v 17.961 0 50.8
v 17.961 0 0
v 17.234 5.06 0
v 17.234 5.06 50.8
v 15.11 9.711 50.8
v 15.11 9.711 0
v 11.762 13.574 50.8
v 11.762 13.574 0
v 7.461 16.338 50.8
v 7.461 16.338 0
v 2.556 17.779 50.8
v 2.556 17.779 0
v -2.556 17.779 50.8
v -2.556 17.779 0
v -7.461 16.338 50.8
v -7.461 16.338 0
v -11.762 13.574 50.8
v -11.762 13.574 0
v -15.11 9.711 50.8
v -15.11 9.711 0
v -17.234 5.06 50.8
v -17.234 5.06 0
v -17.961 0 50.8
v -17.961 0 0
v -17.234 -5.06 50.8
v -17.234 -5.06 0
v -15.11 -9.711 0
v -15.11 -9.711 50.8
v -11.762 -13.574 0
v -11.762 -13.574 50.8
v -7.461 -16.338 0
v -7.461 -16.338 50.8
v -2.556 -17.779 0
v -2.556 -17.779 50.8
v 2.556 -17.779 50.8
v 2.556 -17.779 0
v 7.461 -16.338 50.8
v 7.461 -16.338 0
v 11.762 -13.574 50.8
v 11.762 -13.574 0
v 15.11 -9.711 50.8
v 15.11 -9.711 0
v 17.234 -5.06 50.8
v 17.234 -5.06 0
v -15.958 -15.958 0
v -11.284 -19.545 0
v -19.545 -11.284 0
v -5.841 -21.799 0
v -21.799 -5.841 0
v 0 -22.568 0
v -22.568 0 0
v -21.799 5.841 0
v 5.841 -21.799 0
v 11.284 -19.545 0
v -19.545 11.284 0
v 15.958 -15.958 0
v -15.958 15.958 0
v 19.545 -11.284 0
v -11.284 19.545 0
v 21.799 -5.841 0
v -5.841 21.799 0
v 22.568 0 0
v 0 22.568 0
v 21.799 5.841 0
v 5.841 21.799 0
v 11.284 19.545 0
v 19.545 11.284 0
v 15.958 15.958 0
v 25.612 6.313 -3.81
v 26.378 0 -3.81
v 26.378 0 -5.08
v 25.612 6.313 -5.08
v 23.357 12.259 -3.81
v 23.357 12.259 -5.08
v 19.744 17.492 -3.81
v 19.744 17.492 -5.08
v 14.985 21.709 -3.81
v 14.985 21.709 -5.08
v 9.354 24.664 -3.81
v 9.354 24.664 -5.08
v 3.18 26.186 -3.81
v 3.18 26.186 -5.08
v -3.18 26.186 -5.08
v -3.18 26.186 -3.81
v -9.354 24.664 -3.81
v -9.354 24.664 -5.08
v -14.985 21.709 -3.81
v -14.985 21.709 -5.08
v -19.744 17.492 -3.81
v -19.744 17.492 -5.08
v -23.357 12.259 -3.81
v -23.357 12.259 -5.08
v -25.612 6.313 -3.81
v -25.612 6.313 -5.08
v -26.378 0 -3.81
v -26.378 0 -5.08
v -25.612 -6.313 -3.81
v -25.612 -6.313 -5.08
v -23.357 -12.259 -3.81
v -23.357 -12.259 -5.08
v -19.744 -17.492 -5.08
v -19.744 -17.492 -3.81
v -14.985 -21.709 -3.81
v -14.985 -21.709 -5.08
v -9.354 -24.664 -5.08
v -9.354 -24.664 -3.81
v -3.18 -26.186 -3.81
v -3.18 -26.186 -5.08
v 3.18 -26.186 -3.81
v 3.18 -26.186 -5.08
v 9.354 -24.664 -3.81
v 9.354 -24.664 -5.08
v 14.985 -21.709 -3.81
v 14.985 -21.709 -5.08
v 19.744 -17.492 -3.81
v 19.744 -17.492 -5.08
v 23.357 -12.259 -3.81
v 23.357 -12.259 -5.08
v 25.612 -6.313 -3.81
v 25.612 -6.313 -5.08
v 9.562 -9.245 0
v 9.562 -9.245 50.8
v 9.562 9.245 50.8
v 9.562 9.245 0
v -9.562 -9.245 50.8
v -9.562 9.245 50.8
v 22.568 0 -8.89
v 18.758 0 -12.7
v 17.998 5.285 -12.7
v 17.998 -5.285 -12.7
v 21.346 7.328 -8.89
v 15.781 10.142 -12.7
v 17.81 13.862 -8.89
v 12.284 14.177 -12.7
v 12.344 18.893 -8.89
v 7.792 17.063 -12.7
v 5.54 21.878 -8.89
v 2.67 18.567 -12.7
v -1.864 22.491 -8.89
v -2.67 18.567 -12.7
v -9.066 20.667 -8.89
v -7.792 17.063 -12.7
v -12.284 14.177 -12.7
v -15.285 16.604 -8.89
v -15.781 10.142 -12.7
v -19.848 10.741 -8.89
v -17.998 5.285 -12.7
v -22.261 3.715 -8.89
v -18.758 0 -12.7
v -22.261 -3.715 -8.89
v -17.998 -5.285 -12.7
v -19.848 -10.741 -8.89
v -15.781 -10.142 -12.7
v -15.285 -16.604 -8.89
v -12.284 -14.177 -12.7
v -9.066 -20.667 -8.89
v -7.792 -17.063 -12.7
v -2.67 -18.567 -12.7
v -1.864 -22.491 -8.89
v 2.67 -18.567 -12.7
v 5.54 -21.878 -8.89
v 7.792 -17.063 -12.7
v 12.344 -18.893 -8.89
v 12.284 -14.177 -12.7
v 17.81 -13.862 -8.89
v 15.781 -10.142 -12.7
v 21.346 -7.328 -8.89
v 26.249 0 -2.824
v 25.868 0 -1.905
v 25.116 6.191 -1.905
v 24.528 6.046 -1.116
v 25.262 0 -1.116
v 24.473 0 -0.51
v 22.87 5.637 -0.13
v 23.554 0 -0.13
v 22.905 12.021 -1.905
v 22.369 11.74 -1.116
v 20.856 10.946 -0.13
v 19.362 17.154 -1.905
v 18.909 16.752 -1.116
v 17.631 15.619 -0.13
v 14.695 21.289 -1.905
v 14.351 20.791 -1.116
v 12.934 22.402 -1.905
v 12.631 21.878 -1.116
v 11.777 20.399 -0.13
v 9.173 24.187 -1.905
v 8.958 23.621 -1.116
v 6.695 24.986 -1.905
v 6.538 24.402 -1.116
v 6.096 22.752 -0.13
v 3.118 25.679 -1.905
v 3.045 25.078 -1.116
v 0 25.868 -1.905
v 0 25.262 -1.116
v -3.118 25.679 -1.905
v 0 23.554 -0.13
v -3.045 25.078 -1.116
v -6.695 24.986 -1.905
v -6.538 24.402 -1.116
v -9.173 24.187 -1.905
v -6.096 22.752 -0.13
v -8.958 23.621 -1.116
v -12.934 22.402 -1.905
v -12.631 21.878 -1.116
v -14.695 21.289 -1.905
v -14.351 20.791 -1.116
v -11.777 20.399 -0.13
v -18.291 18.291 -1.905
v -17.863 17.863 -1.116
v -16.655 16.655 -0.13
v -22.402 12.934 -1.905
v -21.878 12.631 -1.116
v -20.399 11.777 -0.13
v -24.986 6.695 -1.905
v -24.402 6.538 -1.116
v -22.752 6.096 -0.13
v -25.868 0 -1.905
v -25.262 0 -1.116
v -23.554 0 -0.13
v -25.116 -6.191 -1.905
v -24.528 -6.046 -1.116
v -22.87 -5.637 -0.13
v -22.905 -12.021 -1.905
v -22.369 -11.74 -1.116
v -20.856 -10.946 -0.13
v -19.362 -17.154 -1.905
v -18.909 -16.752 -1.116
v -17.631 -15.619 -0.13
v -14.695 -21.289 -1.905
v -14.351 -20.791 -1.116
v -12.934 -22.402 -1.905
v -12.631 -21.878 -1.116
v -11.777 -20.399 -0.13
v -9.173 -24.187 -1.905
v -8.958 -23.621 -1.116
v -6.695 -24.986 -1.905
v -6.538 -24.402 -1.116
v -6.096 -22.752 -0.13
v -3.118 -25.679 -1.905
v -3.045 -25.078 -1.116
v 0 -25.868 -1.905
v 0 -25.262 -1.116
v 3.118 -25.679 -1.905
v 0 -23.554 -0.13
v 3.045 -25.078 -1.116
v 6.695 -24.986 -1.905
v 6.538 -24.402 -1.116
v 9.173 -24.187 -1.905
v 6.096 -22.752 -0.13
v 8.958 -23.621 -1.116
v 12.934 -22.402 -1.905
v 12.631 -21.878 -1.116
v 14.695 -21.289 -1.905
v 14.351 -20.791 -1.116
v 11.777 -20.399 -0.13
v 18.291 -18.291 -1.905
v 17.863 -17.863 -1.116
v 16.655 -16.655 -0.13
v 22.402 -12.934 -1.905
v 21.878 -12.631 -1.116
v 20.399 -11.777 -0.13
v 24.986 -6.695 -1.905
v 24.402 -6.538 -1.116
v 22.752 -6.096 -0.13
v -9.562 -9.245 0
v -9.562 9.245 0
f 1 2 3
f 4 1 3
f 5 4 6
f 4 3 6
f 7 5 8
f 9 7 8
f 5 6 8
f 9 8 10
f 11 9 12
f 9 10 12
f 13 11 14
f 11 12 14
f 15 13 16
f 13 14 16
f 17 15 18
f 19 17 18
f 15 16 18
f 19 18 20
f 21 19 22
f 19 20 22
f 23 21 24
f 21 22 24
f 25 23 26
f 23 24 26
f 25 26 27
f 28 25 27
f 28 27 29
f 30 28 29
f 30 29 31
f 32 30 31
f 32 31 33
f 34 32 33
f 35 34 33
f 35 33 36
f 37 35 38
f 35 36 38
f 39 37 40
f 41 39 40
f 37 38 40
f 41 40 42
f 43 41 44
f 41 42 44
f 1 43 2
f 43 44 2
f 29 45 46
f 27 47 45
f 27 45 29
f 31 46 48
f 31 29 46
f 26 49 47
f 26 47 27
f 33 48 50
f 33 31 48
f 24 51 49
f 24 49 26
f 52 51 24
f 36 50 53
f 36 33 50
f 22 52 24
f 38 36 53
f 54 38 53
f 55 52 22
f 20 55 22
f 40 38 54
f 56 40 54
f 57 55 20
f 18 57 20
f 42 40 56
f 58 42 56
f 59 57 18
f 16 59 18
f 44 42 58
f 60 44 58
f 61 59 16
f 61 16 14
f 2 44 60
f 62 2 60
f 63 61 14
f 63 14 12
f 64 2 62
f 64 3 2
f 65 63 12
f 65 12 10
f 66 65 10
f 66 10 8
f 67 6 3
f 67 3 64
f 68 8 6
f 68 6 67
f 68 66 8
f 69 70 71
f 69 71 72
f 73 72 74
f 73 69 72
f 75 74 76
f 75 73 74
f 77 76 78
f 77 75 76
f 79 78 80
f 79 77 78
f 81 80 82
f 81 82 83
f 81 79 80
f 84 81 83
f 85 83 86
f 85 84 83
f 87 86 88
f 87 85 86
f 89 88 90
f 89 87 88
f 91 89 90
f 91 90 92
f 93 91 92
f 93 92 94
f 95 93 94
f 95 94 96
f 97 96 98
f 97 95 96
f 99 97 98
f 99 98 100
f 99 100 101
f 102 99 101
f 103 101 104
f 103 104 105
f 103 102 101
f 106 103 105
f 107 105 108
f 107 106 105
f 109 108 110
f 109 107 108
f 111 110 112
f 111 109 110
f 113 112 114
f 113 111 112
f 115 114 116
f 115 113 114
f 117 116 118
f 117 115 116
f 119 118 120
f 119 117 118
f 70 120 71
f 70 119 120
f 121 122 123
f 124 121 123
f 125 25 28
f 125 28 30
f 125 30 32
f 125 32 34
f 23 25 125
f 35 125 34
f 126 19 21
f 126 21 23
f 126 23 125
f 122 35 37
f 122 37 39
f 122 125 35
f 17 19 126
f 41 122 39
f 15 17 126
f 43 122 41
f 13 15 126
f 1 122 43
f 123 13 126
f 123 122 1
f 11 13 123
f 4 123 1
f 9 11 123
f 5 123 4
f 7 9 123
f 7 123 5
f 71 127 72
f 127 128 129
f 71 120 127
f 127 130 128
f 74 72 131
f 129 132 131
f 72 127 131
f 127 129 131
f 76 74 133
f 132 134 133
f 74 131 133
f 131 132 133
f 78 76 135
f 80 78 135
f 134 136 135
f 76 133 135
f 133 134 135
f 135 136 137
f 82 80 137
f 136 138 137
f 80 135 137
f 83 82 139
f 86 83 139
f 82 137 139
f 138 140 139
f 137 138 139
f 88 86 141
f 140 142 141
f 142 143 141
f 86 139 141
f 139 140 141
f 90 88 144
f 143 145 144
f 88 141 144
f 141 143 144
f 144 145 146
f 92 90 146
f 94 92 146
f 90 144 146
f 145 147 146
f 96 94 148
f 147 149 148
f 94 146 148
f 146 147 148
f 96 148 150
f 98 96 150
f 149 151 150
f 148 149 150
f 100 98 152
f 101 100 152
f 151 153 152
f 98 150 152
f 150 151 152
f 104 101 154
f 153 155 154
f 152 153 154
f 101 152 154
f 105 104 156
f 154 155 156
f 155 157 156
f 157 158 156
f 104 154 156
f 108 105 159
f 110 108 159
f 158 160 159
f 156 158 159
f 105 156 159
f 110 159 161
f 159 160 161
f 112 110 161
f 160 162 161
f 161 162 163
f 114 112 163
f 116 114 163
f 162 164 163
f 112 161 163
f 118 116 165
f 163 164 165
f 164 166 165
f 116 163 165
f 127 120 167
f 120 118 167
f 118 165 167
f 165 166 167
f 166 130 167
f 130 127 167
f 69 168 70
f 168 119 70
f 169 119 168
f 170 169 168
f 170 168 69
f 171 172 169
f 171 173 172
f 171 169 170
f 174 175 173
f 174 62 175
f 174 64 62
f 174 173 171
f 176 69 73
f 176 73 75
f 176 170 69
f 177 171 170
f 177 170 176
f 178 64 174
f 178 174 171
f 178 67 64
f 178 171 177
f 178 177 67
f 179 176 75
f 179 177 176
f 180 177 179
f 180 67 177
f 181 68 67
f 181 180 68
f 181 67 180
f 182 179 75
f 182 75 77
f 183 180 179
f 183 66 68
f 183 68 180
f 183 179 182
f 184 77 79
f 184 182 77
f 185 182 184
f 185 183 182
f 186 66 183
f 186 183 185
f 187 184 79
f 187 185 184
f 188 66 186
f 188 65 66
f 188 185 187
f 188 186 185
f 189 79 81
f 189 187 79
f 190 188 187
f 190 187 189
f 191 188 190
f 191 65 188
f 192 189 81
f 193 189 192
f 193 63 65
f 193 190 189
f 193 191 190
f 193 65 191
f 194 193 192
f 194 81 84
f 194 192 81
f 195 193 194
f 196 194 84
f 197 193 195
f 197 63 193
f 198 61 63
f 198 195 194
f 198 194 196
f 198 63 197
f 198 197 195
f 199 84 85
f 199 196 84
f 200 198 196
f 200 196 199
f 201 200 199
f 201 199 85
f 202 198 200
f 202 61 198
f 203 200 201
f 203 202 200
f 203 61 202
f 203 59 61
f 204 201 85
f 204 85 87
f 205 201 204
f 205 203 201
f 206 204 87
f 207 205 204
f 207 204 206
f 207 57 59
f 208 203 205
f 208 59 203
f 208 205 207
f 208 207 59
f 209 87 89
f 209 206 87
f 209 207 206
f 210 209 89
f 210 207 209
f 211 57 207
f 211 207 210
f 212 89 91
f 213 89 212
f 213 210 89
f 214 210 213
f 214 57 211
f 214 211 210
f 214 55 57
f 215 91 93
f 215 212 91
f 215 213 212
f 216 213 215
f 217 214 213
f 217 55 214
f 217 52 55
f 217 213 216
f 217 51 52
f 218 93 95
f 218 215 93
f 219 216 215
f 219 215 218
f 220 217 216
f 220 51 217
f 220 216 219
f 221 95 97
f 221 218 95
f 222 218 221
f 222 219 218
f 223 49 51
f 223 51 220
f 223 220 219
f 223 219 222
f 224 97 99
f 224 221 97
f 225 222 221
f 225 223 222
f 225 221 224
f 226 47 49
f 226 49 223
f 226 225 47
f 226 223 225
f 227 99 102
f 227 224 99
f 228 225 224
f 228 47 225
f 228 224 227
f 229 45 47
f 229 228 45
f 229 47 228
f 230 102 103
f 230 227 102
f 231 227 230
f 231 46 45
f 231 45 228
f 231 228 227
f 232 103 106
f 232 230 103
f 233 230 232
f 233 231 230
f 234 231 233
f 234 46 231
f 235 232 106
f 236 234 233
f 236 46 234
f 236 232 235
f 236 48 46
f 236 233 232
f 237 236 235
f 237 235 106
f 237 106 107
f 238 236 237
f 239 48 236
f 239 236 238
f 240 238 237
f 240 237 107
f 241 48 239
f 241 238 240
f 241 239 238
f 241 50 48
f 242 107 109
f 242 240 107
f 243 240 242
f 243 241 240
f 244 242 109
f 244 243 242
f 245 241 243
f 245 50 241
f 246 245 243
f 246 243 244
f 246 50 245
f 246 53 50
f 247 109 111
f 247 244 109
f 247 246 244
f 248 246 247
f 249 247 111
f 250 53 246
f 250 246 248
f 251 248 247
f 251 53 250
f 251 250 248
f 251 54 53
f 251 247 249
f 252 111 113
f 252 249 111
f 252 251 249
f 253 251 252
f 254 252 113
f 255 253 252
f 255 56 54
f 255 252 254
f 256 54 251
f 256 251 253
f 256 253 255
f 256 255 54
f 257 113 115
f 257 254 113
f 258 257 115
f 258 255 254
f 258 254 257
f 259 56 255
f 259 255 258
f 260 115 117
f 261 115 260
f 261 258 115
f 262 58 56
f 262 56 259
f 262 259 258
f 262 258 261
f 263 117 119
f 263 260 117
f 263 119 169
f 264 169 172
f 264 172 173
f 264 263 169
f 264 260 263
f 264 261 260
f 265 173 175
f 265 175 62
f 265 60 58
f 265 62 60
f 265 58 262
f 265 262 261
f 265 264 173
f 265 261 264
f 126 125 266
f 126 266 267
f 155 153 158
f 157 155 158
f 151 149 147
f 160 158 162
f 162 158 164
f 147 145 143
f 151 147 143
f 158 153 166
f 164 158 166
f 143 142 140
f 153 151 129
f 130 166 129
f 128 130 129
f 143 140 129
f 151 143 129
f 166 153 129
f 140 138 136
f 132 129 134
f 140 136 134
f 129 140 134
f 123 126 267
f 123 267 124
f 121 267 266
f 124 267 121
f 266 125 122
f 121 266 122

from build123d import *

# Parameters (mm, degrees)
F0_R     = 26.378327
F1_DEPTH = 12.7
F2_R     = 3.81
F3_SIZE  = 7.62
F4_R     = 17.961474
F5_DEPTH = 50.8
F6_W     = 19.1245
F6_H     = 18.48925
F7_DEPTH = 50.8


with BuildPart() as f1:
    # F0 (on Top) → F1 (new body)
    with BuildSketch(Plane.XY):
        Circle(F0_R)
    extrude(amount=-F1_DEPTH)

    # F2
    f2_edges = [f1.edges().sort_by_distance(p)[0] for p in [
        (-26.378327, 0, 0),
    ]]
    fillet(f2_edges, radius=F2_R)

    # F3
    f3_edges = [f1.edges().sort_by_distance(p)[0] for p in [
        (-26.378327, 0, -12.7),
    ]]
    chamfer(f3_edges, length=F3_SIZE)

    # F4 (on face) → F5 (join)
    with BuildSketch(Plane.XY):
        Circle(F4_R)
    extrude(amount=F5_DEPTH)

    # F6 (on face) → F7 (cut)
    with BuildSketch(Plane.XY.offset(50.8)):
        Rectangle(F6_W, F6_H)
    extrude(amount=-F7_DEPTH, mode=Mode.SUBTRACT)


solid = f1.part
